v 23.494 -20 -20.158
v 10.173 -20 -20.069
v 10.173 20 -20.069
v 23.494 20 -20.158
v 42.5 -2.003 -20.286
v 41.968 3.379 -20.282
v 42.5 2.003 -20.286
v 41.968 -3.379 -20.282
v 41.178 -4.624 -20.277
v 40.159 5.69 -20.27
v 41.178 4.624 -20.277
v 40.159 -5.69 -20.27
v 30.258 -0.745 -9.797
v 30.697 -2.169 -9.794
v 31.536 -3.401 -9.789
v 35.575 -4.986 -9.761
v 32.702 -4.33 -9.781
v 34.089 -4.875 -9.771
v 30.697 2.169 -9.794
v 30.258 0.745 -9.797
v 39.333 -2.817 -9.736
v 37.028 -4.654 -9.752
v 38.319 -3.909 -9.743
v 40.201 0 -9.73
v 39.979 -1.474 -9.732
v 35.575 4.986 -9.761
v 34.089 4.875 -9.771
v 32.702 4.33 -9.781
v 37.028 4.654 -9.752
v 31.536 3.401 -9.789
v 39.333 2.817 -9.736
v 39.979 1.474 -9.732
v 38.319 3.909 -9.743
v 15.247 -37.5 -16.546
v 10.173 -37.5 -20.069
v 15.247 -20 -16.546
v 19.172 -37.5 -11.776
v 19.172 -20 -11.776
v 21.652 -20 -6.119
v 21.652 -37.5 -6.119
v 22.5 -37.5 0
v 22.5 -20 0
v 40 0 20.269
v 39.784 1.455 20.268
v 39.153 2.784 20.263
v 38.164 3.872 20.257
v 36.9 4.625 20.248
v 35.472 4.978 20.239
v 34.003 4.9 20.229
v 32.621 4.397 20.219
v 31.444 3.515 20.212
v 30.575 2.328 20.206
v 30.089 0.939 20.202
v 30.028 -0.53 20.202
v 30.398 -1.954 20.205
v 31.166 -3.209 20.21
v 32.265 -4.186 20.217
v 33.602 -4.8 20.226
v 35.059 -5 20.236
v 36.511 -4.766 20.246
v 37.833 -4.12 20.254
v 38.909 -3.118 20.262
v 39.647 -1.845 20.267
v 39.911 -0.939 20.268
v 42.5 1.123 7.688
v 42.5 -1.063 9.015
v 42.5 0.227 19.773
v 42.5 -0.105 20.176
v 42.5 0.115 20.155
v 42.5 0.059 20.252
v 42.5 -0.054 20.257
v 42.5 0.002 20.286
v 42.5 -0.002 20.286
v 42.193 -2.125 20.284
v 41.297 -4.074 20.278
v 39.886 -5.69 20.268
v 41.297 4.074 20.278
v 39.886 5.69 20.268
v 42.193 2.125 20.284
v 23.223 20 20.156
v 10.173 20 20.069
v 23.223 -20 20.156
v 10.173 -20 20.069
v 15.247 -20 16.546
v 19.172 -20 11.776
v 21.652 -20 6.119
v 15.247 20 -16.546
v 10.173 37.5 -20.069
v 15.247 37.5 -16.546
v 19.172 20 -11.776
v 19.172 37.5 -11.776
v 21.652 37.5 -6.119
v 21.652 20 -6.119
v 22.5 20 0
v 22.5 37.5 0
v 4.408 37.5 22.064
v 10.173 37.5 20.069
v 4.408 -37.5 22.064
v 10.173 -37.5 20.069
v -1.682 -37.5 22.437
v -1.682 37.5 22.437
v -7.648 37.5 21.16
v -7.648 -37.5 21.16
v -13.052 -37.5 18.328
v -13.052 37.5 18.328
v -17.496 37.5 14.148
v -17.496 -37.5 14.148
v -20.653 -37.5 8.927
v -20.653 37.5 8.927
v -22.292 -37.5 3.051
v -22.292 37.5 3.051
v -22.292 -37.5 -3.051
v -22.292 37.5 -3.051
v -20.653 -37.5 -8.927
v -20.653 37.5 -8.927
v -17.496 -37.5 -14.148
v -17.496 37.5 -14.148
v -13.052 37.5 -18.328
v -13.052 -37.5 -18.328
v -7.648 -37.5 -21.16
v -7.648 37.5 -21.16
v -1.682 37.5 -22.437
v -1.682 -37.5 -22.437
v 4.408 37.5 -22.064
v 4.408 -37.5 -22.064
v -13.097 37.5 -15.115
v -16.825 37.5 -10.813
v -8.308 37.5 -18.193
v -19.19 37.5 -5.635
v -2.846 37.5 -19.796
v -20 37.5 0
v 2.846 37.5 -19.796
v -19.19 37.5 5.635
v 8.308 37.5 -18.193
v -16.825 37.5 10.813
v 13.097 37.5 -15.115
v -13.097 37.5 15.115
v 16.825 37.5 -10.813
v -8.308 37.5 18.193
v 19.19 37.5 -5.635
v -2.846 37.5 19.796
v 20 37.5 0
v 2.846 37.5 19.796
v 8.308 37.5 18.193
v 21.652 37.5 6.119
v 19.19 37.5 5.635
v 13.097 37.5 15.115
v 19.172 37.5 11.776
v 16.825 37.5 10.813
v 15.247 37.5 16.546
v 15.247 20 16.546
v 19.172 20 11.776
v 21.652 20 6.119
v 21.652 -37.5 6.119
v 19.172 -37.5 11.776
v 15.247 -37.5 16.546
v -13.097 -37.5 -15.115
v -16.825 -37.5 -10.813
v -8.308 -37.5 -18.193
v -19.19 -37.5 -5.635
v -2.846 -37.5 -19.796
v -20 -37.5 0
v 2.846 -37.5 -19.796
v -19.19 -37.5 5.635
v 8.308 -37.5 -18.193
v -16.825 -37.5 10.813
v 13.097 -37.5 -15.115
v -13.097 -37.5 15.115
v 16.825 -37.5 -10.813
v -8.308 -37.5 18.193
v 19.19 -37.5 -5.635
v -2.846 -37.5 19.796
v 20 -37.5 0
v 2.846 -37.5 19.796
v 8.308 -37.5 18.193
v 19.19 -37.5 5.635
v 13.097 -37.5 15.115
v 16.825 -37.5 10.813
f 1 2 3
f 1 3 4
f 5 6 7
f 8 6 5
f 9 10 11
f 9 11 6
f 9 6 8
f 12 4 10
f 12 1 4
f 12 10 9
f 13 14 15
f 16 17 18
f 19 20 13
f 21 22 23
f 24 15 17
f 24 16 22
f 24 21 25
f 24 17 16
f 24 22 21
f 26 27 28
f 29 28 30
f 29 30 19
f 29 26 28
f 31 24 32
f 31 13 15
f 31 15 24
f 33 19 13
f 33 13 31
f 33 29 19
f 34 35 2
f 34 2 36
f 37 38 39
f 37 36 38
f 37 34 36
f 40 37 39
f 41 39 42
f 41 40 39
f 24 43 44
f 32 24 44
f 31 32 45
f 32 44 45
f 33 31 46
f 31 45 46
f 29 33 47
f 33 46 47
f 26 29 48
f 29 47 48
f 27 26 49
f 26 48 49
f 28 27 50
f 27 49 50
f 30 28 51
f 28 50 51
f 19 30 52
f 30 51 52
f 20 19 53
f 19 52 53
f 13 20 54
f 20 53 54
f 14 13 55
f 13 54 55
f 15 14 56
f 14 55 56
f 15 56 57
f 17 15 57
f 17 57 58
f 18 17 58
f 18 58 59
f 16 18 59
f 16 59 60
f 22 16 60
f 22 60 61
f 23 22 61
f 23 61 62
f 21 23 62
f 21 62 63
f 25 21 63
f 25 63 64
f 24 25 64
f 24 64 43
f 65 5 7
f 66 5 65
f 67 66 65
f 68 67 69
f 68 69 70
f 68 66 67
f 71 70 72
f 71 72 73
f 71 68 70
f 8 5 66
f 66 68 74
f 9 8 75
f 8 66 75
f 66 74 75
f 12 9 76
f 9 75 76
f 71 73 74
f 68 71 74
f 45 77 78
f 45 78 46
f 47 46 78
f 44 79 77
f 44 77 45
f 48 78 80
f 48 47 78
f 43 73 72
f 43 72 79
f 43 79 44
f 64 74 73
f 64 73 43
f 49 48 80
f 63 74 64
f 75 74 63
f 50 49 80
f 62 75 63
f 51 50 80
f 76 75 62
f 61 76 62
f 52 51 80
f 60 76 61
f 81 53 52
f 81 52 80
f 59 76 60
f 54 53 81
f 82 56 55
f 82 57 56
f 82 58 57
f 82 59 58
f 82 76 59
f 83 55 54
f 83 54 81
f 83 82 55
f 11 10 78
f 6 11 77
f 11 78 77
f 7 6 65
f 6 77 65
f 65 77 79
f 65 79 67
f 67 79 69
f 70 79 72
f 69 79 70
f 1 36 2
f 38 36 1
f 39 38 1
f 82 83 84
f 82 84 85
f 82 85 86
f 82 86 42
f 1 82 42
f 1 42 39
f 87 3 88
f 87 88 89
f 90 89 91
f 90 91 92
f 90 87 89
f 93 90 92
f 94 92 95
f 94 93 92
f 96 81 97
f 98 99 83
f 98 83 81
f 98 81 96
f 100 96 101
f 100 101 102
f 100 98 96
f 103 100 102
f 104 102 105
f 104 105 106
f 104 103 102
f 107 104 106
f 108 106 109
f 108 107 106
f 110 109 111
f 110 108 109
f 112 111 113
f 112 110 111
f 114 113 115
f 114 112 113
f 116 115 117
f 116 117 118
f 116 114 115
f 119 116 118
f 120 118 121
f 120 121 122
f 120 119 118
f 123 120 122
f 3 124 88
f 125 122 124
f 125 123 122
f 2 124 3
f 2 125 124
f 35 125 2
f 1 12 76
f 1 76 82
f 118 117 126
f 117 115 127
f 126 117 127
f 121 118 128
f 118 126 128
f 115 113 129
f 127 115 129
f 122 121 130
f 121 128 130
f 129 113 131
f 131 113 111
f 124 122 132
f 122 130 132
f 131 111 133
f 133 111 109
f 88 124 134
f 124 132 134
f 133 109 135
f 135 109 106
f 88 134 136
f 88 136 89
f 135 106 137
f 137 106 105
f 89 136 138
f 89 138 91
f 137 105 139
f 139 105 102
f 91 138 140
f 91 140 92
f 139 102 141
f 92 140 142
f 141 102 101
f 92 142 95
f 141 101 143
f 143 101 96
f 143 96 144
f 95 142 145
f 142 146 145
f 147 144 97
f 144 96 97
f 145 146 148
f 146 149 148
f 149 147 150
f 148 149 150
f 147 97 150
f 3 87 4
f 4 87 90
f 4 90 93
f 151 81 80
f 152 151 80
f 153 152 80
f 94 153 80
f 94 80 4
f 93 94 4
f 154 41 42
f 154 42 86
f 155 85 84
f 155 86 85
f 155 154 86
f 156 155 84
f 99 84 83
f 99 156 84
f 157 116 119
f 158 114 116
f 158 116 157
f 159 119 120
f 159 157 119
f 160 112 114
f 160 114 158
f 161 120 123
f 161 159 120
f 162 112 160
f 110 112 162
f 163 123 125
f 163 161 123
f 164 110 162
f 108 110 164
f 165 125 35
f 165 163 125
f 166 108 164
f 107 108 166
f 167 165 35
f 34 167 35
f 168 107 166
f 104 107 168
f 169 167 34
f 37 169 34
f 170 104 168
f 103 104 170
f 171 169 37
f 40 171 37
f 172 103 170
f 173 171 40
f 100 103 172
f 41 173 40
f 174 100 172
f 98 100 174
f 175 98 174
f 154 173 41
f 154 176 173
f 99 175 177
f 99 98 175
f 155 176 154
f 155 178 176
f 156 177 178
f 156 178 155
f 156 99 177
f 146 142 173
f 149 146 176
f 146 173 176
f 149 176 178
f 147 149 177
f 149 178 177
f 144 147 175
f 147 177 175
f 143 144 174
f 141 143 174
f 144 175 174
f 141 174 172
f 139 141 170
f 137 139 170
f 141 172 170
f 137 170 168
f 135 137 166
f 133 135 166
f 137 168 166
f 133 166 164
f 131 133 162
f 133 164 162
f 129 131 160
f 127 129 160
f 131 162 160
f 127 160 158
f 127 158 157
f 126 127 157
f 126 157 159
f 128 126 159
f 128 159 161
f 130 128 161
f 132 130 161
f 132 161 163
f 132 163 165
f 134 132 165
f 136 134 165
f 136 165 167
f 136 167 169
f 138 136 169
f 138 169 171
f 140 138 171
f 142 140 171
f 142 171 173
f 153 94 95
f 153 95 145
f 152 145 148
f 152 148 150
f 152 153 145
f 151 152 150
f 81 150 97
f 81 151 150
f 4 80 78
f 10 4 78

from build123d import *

# Parameters (mm, degrees)
F1_DEPTH = 37.5
F2_DEPTH = 20
F4_DEPTH = 70
F3_R     = 5
F5_DEPTH = 30
F6_R     = 20
F7_DEPTH = 100


with BuildPart() as f1:
    # F0 (on Front) → F1 (new body, symmetric)
    with BuildSketch(Plane.XZ):
        with BuildLine():
            ThreePointArc((10.173274, -20.068744), (19.172228, -11.776064), (22.5, 0))
            ThreePointArc((22.5, 0), (19.172228, 11.776064), (10.173274, 20.068744))
            ThreePointArc((10.173274, 20.068744), (-22.5, 0), (10.173274, -20.068744))
        make_face()
    extrude(amount=F1_DEPTH, both=True)

    # F0 (on Front) → F2 (join, symmetric)
    with BuildSketch(Plane.XZ):
        with BuildLine():
            ThreePointArc((10.173274, 20.068744), (19.172228, 11.776064), (22.5, 0))
            ThreePointArc((22.5, 0), (19.172228, -11.776064), (10.173274, -20.068744))
            Line((10.173274, -20.068744), (42.5, -20.285756))
            Line((42.5, -20.285756), (42.5, 0))
            Line((42.5, 0), (42.5, 20.285756))
            Line((42.5, 20.285756), (10.173274, 20.068744))
        make_face()
    extrude(amount=F2_DEPTH, both=True)

    # F3 (on face) → F4 (cut)
    with BuildSketch(Plane(origin=(-0.134258, 0, 19.999549), x_dir=(0.999977, 0, 0.006713), z_dir=(-0.006713, 0, 0.999977))):
        with BuildLine():
            ThreePointArc((40.021521, 5.68982), (41.950542, 3.130714), (42.635219, 0))
            Line((42.635219, 0), (42.635219, 20))
            Line((42.635219, 20), (23.358133, 20))
            Line((23.358133, 20), (40.021521, 5.68982))
        make_face()
        with BuildLine():
            Line((42.635219, -20), (42.635219, 0))
            ThreePointArc((42.635219, 0), (41.950542, -3.130714), (40.021521, -5.68982))
            Line((40.021521, -5.68982), (23.358133, -20))
            Line((23.358133, -20), (42.635219, -20))
        make_face()
    extrude(amount=-F4_DEPTH, mode=Mode.SUBTRACT)

    # F3 (on face) → F5 (cut)
    with BuildSketch(Plane(origin=(-0.134258, 0, 19.999549), x_dir=(0.999977, 0, 0.006713), z_dir=(-0.006713, 0, 0.999977))):
        with Locations((35.135219, 0)):
            Circle(F3_R)
    extrude(amount=-F5_DEPTH, mode=Mode.SUBTRACT)

    # F6 (on face) → F7 (cut)
    with BuildSketch(Plane.XZ.offset(37.5)):
        Circle(F6_R)
    extrude(amount=-F7_DEPTH, mode=Mode.SUBTRACT)


solid = f1.part
